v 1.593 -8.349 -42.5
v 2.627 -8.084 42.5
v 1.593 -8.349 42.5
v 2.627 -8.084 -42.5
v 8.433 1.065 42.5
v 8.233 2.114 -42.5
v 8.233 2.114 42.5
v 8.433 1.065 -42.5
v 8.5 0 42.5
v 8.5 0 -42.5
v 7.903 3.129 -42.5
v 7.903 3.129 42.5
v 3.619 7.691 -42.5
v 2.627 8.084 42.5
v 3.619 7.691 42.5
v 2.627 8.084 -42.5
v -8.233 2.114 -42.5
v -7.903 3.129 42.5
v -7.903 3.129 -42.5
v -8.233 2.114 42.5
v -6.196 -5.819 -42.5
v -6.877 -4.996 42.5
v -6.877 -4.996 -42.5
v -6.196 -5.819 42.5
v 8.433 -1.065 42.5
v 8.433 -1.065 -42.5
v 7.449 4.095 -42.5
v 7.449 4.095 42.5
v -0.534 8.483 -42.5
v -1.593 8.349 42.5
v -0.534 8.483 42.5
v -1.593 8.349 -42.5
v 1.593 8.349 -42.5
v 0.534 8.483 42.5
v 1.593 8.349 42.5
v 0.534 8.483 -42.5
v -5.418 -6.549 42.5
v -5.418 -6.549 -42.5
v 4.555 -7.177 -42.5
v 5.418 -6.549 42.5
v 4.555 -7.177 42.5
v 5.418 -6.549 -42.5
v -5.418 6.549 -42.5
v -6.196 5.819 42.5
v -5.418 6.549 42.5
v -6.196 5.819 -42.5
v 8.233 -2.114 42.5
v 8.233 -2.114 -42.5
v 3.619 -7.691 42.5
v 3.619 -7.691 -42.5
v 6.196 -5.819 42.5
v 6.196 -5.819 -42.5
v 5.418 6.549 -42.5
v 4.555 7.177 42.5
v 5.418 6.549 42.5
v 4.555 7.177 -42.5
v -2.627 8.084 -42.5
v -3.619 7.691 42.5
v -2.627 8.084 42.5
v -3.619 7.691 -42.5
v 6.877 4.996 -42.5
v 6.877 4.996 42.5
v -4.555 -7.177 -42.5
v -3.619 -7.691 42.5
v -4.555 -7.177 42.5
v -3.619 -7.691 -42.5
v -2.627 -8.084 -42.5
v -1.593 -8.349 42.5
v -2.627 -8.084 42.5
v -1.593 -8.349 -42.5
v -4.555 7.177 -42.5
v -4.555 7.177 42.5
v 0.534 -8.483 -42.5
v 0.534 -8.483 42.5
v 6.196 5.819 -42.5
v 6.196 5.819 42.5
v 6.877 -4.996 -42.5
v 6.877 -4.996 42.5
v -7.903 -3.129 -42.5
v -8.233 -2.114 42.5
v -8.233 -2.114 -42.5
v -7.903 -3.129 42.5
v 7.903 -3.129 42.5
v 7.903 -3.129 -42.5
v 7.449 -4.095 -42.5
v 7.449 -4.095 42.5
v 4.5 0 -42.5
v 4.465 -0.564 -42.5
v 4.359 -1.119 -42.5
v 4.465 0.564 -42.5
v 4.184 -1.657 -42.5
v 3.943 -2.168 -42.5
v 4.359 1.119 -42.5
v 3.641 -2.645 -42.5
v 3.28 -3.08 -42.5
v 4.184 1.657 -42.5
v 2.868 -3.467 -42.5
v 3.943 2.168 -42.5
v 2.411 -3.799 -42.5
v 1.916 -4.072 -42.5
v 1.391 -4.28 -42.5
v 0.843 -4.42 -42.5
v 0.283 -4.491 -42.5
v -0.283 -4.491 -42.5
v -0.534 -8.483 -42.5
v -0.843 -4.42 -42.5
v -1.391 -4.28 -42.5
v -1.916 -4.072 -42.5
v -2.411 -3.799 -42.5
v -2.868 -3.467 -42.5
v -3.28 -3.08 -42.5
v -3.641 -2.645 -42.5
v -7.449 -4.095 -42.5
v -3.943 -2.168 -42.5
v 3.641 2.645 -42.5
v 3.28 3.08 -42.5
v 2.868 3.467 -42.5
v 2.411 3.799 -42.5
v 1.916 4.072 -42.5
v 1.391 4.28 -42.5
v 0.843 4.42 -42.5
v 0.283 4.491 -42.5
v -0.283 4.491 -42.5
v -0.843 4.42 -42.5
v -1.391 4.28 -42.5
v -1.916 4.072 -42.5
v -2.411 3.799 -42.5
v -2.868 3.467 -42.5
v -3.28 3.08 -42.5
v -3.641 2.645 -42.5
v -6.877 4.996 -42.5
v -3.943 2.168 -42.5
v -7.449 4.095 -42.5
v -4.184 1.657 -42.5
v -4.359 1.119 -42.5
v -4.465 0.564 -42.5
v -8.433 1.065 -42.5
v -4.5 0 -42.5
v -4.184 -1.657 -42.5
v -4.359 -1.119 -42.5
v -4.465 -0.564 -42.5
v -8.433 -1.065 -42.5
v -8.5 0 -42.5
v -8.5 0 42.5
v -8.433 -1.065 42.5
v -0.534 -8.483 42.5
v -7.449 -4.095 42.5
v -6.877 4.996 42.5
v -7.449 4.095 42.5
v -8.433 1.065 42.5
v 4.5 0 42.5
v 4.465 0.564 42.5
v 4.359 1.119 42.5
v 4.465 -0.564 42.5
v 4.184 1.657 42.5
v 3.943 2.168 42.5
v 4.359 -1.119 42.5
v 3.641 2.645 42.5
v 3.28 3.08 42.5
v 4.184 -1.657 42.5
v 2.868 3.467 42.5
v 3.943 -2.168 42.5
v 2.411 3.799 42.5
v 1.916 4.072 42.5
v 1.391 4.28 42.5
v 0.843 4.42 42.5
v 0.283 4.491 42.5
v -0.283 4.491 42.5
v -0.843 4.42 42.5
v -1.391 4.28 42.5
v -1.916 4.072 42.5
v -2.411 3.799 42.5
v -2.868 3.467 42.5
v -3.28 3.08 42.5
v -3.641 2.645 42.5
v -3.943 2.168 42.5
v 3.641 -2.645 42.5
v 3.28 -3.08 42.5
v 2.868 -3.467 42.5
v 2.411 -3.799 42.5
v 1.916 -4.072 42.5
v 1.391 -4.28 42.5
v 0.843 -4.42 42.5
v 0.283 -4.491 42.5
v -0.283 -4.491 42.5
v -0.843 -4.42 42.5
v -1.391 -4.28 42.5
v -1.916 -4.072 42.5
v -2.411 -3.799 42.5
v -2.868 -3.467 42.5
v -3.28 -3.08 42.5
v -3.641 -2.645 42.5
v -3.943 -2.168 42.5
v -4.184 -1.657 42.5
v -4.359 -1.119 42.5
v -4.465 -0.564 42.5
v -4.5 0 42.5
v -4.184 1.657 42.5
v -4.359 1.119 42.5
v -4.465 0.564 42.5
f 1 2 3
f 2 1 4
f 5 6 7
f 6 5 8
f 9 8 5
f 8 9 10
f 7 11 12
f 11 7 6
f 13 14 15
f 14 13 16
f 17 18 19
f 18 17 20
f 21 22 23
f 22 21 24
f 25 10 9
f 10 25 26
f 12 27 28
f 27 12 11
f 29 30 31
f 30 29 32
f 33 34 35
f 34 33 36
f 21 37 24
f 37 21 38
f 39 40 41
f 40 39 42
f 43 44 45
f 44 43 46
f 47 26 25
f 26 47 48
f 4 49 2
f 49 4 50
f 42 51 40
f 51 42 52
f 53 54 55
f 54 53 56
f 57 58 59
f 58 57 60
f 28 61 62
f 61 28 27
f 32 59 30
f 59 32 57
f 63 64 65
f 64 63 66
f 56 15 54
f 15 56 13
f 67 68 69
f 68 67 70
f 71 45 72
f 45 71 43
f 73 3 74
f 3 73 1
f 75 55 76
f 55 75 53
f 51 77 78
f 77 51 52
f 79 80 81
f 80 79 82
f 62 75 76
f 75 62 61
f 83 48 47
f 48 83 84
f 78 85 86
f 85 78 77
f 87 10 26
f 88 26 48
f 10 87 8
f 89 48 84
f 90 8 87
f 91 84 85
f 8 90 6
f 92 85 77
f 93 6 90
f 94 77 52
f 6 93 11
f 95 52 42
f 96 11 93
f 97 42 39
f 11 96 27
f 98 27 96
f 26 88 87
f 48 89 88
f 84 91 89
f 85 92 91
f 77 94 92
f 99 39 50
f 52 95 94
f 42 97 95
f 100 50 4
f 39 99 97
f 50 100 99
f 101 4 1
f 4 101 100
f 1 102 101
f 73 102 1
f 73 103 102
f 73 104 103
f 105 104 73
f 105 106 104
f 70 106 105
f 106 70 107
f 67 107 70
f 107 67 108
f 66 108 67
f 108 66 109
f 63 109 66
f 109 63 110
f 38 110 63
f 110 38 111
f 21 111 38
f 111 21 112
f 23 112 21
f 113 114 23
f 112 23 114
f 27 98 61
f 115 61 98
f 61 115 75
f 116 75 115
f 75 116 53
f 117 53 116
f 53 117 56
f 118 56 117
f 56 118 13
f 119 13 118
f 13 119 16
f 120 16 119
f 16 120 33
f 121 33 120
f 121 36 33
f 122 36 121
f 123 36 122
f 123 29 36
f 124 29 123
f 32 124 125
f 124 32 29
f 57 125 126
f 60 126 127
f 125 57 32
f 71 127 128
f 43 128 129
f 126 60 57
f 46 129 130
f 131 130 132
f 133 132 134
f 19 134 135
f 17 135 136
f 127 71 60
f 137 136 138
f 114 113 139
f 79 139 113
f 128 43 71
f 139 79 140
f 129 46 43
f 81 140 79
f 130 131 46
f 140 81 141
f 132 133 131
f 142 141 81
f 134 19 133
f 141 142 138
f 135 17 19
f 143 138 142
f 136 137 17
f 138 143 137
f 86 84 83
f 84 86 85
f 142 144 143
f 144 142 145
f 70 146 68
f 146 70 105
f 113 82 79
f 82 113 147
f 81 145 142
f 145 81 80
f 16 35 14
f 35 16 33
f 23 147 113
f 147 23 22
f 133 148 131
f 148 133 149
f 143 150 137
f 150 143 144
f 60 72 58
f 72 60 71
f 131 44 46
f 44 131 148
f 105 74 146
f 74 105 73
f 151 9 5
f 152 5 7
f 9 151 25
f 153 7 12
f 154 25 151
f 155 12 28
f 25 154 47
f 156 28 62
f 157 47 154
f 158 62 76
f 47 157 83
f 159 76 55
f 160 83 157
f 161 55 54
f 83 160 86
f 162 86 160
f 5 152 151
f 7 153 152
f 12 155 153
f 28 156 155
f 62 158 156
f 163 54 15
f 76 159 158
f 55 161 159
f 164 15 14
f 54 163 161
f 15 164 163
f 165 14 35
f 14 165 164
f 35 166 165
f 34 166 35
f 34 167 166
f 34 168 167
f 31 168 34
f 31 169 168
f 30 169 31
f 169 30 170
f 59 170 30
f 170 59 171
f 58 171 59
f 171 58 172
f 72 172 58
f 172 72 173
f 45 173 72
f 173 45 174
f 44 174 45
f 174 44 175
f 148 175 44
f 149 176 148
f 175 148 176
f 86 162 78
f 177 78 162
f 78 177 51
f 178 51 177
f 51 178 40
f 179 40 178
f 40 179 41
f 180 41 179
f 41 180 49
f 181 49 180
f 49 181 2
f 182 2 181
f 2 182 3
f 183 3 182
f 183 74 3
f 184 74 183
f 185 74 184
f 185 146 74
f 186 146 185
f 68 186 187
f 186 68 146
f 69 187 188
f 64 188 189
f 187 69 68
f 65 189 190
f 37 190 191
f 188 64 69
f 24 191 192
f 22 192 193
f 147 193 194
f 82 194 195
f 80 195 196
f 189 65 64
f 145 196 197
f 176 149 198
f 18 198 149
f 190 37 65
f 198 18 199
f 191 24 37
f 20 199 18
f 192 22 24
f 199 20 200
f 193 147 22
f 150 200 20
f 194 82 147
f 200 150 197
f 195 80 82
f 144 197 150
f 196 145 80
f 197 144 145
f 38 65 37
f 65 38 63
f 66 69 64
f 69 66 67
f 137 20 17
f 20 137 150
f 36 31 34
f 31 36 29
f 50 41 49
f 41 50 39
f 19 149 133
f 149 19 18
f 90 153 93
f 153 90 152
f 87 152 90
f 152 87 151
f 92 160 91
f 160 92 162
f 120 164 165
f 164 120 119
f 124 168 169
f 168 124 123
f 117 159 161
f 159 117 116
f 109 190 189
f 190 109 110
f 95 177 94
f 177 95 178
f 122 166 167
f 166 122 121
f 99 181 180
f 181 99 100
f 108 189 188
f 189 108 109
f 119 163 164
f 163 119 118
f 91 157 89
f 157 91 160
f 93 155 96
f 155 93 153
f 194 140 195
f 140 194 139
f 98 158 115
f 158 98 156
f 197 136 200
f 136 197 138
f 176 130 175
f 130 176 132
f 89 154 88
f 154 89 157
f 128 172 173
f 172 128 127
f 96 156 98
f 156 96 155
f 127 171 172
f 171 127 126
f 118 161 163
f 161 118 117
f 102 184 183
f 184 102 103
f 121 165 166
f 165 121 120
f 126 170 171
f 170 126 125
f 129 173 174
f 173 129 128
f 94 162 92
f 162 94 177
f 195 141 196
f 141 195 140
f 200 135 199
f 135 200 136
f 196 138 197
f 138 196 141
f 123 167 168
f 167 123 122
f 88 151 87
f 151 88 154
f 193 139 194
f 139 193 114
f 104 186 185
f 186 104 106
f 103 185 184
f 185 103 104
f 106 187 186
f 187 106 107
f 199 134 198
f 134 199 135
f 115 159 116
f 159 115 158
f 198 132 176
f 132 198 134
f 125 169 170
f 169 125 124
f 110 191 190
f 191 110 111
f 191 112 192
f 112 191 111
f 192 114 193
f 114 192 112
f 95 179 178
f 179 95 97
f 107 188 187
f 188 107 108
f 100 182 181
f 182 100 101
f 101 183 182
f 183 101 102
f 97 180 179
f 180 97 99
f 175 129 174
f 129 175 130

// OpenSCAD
$fn = 50;


difference() {
	union() {
		translate(v = [0, 0, -42.5000000000]) {
			cylinder(h = 85, r = 8.5000000000);
		}
	}
	union() {
		translate(v = [0, 0, -100.0000000000]) {
			cylinder(h = 200, r = 4.5000000000);
		}
	}
}
